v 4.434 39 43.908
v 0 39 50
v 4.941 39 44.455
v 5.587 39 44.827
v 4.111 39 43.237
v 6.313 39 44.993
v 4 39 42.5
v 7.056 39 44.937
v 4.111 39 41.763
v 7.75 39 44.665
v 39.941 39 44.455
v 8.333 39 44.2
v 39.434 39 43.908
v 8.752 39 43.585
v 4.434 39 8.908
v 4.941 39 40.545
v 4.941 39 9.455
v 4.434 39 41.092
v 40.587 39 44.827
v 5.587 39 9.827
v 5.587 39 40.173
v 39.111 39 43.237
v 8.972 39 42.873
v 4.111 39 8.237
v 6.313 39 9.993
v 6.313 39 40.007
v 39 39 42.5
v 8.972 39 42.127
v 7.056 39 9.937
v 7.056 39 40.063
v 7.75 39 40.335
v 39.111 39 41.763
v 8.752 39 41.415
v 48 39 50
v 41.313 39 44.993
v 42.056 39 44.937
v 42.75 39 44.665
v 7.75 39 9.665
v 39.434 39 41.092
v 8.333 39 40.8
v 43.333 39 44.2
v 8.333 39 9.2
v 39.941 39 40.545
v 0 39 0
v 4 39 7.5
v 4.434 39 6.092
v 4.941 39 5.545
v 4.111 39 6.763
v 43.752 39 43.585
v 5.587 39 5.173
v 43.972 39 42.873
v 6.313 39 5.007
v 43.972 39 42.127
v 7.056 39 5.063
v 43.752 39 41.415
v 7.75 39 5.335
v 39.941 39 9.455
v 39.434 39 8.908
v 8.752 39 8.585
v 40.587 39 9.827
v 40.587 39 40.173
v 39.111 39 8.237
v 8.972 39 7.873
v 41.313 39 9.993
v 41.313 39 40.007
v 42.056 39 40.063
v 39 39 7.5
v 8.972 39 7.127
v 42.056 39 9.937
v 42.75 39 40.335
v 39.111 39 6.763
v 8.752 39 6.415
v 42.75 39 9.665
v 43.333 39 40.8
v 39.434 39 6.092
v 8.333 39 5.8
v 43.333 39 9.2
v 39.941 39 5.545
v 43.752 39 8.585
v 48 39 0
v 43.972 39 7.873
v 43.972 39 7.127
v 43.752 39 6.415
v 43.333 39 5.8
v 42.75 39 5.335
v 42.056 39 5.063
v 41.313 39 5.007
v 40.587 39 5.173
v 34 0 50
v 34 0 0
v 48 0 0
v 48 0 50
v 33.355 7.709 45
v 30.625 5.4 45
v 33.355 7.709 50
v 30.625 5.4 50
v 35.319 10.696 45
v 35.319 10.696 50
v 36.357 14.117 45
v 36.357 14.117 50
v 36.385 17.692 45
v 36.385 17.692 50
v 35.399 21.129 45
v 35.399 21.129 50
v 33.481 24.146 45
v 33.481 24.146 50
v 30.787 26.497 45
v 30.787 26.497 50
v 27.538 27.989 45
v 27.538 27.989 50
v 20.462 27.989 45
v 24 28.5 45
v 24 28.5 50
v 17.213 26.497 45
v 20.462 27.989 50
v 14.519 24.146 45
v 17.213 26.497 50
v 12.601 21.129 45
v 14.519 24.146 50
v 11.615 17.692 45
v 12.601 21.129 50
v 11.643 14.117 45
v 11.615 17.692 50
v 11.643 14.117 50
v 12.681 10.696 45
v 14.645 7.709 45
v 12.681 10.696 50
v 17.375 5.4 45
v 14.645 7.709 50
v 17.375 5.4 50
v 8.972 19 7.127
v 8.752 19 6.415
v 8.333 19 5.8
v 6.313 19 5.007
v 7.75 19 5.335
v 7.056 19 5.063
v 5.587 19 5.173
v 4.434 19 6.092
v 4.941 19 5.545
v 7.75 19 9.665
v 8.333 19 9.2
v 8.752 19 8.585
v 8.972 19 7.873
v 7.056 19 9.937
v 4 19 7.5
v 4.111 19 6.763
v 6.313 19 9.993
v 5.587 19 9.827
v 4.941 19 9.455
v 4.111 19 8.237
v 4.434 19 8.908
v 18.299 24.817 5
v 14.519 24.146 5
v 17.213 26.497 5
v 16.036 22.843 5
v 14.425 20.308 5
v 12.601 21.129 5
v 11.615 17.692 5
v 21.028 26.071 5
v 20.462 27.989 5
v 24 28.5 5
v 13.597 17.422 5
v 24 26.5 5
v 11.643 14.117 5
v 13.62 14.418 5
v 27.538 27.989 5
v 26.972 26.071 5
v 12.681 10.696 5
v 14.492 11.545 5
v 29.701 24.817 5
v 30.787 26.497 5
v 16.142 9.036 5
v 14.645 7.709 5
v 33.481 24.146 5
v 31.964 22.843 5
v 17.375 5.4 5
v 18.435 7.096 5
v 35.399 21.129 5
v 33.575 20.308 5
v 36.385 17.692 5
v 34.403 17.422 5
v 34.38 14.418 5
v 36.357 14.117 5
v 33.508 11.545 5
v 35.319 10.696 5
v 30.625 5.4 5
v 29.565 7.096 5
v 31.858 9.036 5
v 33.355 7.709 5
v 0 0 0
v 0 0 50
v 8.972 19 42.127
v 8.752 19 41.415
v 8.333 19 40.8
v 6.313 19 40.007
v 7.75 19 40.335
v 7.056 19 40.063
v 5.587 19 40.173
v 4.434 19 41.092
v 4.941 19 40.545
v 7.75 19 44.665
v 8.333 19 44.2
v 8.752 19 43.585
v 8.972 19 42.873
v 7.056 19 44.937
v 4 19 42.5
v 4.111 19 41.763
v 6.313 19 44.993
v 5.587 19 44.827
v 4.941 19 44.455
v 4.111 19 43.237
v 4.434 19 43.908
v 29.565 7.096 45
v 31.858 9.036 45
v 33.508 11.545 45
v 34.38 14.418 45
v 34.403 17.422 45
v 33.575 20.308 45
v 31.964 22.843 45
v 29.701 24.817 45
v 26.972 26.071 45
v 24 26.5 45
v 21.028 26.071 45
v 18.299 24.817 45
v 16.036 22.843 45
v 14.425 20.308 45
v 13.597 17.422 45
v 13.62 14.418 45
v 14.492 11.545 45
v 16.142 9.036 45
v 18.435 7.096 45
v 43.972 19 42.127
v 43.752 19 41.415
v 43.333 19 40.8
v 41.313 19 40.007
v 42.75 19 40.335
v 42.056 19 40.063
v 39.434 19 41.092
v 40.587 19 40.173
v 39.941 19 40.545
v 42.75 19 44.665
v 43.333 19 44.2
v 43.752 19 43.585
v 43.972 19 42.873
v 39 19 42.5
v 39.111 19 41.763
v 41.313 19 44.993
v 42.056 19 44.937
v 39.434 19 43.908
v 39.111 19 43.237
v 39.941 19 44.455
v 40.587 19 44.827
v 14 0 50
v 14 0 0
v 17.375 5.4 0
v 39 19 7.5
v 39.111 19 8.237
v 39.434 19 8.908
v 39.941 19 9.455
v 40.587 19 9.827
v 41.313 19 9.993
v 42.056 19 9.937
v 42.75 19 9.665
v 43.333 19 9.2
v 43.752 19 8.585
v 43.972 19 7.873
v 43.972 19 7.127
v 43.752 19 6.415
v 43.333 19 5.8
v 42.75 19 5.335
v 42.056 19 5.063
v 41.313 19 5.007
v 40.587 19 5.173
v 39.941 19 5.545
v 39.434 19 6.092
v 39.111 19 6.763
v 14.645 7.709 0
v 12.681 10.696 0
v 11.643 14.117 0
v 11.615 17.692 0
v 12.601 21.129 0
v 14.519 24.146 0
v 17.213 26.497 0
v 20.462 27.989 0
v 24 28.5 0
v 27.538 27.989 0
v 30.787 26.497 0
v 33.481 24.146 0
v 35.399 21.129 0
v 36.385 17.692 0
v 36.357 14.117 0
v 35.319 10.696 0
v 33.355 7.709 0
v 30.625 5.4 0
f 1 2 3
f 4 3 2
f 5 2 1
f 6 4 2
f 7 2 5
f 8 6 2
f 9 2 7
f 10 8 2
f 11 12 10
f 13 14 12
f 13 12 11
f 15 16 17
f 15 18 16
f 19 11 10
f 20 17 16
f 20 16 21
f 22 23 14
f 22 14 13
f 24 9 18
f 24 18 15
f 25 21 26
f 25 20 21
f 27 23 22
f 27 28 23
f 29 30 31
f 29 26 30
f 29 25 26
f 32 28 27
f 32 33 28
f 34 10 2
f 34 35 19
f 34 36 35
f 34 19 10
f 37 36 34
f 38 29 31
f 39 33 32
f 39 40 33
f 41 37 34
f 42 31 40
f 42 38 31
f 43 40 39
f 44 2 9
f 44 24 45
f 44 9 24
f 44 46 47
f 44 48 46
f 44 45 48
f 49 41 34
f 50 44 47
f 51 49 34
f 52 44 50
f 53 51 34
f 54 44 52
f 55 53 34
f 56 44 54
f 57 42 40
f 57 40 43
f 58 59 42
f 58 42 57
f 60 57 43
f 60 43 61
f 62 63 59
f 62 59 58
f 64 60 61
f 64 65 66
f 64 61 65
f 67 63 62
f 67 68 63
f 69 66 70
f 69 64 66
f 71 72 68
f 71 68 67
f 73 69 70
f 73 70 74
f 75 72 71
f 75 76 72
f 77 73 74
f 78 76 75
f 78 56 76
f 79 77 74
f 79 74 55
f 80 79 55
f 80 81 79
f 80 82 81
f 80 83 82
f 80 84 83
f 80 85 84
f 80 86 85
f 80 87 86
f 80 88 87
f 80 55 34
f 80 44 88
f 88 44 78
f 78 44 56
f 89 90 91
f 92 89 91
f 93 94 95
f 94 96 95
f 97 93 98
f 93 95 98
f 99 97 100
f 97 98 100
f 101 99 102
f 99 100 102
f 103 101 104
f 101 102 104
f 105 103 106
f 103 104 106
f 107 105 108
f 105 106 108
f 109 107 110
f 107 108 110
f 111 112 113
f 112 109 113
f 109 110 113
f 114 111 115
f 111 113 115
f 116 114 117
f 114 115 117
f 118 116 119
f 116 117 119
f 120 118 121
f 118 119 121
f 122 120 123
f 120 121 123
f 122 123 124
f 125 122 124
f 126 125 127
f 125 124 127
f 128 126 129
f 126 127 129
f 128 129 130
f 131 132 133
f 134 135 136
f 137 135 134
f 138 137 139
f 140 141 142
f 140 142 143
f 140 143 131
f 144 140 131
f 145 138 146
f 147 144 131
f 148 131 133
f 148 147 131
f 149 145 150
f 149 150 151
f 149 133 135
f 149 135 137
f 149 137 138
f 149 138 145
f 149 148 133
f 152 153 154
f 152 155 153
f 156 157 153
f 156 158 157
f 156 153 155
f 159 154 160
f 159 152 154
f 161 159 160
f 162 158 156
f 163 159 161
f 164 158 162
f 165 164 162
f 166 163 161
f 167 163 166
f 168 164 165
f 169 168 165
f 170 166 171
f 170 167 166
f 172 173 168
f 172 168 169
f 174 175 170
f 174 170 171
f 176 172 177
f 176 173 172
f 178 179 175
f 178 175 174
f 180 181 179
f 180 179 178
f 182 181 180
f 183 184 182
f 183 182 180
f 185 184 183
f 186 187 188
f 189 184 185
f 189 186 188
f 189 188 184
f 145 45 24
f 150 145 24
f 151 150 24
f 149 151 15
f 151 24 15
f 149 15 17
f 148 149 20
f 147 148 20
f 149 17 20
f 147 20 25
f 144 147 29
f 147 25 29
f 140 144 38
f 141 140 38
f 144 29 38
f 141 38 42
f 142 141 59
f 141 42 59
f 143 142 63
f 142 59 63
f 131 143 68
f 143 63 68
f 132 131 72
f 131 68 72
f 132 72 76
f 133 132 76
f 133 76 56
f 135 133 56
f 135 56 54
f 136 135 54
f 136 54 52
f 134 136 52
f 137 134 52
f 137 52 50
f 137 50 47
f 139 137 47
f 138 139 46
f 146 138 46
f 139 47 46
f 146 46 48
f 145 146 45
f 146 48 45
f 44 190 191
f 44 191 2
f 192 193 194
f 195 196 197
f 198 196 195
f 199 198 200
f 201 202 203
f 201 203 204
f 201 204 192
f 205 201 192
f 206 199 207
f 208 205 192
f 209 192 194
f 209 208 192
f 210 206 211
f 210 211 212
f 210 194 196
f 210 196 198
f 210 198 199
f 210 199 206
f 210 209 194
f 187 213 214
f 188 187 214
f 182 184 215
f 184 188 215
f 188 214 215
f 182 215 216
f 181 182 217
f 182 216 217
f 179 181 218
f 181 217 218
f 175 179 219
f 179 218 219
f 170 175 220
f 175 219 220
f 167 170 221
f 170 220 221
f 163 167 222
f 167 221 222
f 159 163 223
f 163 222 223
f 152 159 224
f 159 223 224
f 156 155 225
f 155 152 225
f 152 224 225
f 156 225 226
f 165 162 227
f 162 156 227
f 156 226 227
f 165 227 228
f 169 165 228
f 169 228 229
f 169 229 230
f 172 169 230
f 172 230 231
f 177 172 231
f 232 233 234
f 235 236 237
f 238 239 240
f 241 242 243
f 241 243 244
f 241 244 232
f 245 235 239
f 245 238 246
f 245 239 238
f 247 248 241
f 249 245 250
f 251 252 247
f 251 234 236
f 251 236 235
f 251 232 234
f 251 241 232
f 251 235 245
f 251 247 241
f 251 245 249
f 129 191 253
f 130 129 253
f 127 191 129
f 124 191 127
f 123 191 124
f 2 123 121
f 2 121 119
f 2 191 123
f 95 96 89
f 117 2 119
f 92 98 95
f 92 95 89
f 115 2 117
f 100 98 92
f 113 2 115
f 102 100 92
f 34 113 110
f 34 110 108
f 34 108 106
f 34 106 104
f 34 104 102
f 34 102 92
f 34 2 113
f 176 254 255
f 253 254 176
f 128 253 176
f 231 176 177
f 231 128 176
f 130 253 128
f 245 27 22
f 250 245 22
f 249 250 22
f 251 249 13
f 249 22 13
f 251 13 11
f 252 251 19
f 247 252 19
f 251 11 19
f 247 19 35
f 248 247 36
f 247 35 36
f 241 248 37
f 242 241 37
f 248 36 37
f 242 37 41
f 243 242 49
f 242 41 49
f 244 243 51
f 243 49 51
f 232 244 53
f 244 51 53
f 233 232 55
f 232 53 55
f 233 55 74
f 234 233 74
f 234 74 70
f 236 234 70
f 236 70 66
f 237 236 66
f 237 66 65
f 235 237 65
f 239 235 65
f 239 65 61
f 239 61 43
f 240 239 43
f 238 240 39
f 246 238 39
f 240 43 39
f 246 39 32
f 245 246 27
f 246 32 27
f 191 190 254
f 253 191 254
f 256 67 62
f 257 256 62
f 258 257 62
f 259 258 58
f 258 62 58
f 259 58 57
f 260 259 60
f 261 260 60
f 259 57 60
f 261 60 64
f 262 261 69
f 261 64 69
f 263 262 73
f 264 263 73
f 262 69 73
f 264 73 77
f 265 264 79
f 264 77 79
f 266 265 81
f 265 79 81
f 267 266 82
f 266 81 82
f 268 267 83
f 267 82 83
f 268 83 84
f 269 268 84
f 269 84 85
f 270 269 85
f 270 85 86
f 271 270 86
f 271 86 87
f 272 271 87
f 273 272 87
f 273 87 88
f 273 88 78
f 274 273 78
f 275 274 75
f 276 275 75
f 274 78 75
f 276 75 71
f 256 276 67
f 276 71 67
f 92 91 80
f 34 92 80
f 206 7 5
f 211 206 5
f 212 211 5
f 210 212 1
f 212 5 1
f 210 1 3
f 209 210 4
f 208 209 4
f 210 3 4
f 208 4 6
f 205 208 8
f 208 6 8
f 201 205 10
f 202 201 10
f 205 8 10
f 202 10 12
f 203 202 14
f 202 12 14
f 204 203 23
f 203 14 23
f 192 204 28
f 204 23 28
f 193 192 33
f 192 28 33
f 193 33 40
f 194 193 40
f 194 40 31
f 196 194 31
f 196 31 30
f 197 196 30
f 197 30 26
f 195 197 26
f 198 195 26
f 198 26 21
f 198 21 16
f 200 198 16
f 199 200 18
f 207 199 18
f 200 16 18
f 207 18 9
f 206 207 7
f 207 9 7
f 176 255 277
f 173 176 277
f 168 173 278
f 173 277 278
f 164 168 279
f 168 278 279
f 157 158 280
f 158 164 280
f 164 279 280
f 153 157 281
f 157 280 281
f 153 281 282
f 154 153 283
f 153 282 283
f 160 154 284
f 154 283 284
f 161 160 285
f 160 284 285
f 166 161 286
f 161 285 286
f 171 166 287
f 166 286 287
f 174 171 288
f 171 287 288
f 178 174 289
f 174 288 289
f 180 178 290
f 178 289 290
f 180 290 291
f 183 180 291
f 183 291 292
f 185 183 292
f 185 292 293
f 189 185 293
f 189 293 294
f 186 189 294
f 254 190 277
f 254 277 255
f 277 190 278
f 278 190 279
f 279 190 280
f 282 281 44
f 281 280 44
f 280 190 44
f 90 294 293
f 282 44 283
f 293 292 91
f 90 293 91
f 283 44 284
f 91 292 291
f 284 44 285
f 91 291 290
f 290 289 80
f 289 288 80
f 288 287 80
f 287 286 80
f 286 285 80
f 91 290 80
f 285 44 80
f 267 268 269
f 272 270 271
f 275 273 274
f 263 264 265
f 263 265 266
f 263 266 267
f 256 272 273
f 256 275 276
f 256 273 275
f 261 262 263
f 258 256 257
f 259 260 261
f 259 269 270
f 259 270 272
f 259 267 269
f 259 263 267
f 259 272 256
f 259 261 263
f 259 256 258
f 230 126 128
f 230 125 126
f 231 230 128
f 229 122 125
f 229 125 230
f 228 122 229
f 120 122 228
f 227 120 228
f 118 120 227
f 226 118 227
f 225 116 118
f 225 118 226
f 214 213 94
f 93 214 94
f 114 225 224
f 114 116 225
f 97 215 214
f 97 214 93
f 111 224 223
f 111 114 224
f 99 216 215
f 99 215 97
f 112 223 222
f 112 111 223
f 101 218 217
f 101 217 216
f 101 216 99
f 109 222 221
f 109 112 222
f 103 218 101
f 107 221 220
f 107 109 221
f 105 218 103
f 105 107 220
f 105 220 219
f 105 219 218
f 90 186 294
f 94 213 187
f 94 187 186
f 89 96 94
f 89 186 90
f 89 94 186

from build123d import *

# Parameters (mm, degrees)
SKETCH_W        = 48
SKETCH_H        = 39
PAD_DEPTH       = 50
SKETCH001_R     = 10.5
POCKET_DEPTH    = 51
SKETCH002_R     = 12.5
POCKET001_DEPTH = 5
SKETCH003_R     = 12.5
POCKET002_DEPTH = 5
POCKET003_DEPTH = 51
SKETCH005_R     = 2.5
POCKET004_DEPTH = 20


with BuildPart() as part:
    # Sketch → Pad (new body)
    with BuildSketch(Plane.XY):
        with Locations((24, 19.5)):
            Rectangle(SKETCH_W, SKETCH_H)
    extrude(amount=PAD_DEPTH)

    # Sketch001 → Pocket (cut)
    with BuildSketch(Plane.XY.offset(50)):
        with Locations((24, 16)):
            Circle(SKETCH001_R)
    extrude(amount=-POCKET_DEPTH, mode=Mode.SUBTRACT)

    # Sketch002 → Pocket001 (cut)
    with BuildSketch(Plane.XY.offset(50)):
        with Locations((24, 16)):
            Circle(SKETCH002_R)
    extrude(amount=-POCKET001_DEPTH, mode=Mode.SUBTRACT)

    # Sketch003 → Pocket002 (cut)
    with BuildSketch(Plane(origin=(0, 0, 0), x_dir=(1, 0, 0), z_dir=(0, 0, -1))):
        with Locations((24, -16)):
            Circle(SKETCH003_R)
    extrude(amount=-POCKET002_DEPTH, mode=Mode.SUBTRACT)

    # Sketch004 → Pocket003 (cut)
    with BuildSketch(Plane.XY.offset(50)):
        Polygon((14, 0), (24, 16), (34, 0), align=None)
    extrude(amount=-POCKET003_DEPTH, mode=Mode.SUBTRACT)

    # Sketch005 → Pocket004 (cut)
    with BuildSketch(Plane(origin=(0, 39, 0), x_dir=(-1, 0, 0), z_dir=(0, 1, 0))):
        with Locations((-41.5, 42.5)):
            Circle(SKETCH005_R)
        with Locations((-6.5, 42.5)):
            Circle(SKETCH005_R)
        with Locations((-41.5, 7.5)):
            Circle(SKETCH005_R)
        with Locations((-6.5, 7.5)):
            Circle(SKETCH005_R)
    extrude(amount=-POCKET004_DEPTH, mode=Mode.SUBTRACT)


solid = part.part
